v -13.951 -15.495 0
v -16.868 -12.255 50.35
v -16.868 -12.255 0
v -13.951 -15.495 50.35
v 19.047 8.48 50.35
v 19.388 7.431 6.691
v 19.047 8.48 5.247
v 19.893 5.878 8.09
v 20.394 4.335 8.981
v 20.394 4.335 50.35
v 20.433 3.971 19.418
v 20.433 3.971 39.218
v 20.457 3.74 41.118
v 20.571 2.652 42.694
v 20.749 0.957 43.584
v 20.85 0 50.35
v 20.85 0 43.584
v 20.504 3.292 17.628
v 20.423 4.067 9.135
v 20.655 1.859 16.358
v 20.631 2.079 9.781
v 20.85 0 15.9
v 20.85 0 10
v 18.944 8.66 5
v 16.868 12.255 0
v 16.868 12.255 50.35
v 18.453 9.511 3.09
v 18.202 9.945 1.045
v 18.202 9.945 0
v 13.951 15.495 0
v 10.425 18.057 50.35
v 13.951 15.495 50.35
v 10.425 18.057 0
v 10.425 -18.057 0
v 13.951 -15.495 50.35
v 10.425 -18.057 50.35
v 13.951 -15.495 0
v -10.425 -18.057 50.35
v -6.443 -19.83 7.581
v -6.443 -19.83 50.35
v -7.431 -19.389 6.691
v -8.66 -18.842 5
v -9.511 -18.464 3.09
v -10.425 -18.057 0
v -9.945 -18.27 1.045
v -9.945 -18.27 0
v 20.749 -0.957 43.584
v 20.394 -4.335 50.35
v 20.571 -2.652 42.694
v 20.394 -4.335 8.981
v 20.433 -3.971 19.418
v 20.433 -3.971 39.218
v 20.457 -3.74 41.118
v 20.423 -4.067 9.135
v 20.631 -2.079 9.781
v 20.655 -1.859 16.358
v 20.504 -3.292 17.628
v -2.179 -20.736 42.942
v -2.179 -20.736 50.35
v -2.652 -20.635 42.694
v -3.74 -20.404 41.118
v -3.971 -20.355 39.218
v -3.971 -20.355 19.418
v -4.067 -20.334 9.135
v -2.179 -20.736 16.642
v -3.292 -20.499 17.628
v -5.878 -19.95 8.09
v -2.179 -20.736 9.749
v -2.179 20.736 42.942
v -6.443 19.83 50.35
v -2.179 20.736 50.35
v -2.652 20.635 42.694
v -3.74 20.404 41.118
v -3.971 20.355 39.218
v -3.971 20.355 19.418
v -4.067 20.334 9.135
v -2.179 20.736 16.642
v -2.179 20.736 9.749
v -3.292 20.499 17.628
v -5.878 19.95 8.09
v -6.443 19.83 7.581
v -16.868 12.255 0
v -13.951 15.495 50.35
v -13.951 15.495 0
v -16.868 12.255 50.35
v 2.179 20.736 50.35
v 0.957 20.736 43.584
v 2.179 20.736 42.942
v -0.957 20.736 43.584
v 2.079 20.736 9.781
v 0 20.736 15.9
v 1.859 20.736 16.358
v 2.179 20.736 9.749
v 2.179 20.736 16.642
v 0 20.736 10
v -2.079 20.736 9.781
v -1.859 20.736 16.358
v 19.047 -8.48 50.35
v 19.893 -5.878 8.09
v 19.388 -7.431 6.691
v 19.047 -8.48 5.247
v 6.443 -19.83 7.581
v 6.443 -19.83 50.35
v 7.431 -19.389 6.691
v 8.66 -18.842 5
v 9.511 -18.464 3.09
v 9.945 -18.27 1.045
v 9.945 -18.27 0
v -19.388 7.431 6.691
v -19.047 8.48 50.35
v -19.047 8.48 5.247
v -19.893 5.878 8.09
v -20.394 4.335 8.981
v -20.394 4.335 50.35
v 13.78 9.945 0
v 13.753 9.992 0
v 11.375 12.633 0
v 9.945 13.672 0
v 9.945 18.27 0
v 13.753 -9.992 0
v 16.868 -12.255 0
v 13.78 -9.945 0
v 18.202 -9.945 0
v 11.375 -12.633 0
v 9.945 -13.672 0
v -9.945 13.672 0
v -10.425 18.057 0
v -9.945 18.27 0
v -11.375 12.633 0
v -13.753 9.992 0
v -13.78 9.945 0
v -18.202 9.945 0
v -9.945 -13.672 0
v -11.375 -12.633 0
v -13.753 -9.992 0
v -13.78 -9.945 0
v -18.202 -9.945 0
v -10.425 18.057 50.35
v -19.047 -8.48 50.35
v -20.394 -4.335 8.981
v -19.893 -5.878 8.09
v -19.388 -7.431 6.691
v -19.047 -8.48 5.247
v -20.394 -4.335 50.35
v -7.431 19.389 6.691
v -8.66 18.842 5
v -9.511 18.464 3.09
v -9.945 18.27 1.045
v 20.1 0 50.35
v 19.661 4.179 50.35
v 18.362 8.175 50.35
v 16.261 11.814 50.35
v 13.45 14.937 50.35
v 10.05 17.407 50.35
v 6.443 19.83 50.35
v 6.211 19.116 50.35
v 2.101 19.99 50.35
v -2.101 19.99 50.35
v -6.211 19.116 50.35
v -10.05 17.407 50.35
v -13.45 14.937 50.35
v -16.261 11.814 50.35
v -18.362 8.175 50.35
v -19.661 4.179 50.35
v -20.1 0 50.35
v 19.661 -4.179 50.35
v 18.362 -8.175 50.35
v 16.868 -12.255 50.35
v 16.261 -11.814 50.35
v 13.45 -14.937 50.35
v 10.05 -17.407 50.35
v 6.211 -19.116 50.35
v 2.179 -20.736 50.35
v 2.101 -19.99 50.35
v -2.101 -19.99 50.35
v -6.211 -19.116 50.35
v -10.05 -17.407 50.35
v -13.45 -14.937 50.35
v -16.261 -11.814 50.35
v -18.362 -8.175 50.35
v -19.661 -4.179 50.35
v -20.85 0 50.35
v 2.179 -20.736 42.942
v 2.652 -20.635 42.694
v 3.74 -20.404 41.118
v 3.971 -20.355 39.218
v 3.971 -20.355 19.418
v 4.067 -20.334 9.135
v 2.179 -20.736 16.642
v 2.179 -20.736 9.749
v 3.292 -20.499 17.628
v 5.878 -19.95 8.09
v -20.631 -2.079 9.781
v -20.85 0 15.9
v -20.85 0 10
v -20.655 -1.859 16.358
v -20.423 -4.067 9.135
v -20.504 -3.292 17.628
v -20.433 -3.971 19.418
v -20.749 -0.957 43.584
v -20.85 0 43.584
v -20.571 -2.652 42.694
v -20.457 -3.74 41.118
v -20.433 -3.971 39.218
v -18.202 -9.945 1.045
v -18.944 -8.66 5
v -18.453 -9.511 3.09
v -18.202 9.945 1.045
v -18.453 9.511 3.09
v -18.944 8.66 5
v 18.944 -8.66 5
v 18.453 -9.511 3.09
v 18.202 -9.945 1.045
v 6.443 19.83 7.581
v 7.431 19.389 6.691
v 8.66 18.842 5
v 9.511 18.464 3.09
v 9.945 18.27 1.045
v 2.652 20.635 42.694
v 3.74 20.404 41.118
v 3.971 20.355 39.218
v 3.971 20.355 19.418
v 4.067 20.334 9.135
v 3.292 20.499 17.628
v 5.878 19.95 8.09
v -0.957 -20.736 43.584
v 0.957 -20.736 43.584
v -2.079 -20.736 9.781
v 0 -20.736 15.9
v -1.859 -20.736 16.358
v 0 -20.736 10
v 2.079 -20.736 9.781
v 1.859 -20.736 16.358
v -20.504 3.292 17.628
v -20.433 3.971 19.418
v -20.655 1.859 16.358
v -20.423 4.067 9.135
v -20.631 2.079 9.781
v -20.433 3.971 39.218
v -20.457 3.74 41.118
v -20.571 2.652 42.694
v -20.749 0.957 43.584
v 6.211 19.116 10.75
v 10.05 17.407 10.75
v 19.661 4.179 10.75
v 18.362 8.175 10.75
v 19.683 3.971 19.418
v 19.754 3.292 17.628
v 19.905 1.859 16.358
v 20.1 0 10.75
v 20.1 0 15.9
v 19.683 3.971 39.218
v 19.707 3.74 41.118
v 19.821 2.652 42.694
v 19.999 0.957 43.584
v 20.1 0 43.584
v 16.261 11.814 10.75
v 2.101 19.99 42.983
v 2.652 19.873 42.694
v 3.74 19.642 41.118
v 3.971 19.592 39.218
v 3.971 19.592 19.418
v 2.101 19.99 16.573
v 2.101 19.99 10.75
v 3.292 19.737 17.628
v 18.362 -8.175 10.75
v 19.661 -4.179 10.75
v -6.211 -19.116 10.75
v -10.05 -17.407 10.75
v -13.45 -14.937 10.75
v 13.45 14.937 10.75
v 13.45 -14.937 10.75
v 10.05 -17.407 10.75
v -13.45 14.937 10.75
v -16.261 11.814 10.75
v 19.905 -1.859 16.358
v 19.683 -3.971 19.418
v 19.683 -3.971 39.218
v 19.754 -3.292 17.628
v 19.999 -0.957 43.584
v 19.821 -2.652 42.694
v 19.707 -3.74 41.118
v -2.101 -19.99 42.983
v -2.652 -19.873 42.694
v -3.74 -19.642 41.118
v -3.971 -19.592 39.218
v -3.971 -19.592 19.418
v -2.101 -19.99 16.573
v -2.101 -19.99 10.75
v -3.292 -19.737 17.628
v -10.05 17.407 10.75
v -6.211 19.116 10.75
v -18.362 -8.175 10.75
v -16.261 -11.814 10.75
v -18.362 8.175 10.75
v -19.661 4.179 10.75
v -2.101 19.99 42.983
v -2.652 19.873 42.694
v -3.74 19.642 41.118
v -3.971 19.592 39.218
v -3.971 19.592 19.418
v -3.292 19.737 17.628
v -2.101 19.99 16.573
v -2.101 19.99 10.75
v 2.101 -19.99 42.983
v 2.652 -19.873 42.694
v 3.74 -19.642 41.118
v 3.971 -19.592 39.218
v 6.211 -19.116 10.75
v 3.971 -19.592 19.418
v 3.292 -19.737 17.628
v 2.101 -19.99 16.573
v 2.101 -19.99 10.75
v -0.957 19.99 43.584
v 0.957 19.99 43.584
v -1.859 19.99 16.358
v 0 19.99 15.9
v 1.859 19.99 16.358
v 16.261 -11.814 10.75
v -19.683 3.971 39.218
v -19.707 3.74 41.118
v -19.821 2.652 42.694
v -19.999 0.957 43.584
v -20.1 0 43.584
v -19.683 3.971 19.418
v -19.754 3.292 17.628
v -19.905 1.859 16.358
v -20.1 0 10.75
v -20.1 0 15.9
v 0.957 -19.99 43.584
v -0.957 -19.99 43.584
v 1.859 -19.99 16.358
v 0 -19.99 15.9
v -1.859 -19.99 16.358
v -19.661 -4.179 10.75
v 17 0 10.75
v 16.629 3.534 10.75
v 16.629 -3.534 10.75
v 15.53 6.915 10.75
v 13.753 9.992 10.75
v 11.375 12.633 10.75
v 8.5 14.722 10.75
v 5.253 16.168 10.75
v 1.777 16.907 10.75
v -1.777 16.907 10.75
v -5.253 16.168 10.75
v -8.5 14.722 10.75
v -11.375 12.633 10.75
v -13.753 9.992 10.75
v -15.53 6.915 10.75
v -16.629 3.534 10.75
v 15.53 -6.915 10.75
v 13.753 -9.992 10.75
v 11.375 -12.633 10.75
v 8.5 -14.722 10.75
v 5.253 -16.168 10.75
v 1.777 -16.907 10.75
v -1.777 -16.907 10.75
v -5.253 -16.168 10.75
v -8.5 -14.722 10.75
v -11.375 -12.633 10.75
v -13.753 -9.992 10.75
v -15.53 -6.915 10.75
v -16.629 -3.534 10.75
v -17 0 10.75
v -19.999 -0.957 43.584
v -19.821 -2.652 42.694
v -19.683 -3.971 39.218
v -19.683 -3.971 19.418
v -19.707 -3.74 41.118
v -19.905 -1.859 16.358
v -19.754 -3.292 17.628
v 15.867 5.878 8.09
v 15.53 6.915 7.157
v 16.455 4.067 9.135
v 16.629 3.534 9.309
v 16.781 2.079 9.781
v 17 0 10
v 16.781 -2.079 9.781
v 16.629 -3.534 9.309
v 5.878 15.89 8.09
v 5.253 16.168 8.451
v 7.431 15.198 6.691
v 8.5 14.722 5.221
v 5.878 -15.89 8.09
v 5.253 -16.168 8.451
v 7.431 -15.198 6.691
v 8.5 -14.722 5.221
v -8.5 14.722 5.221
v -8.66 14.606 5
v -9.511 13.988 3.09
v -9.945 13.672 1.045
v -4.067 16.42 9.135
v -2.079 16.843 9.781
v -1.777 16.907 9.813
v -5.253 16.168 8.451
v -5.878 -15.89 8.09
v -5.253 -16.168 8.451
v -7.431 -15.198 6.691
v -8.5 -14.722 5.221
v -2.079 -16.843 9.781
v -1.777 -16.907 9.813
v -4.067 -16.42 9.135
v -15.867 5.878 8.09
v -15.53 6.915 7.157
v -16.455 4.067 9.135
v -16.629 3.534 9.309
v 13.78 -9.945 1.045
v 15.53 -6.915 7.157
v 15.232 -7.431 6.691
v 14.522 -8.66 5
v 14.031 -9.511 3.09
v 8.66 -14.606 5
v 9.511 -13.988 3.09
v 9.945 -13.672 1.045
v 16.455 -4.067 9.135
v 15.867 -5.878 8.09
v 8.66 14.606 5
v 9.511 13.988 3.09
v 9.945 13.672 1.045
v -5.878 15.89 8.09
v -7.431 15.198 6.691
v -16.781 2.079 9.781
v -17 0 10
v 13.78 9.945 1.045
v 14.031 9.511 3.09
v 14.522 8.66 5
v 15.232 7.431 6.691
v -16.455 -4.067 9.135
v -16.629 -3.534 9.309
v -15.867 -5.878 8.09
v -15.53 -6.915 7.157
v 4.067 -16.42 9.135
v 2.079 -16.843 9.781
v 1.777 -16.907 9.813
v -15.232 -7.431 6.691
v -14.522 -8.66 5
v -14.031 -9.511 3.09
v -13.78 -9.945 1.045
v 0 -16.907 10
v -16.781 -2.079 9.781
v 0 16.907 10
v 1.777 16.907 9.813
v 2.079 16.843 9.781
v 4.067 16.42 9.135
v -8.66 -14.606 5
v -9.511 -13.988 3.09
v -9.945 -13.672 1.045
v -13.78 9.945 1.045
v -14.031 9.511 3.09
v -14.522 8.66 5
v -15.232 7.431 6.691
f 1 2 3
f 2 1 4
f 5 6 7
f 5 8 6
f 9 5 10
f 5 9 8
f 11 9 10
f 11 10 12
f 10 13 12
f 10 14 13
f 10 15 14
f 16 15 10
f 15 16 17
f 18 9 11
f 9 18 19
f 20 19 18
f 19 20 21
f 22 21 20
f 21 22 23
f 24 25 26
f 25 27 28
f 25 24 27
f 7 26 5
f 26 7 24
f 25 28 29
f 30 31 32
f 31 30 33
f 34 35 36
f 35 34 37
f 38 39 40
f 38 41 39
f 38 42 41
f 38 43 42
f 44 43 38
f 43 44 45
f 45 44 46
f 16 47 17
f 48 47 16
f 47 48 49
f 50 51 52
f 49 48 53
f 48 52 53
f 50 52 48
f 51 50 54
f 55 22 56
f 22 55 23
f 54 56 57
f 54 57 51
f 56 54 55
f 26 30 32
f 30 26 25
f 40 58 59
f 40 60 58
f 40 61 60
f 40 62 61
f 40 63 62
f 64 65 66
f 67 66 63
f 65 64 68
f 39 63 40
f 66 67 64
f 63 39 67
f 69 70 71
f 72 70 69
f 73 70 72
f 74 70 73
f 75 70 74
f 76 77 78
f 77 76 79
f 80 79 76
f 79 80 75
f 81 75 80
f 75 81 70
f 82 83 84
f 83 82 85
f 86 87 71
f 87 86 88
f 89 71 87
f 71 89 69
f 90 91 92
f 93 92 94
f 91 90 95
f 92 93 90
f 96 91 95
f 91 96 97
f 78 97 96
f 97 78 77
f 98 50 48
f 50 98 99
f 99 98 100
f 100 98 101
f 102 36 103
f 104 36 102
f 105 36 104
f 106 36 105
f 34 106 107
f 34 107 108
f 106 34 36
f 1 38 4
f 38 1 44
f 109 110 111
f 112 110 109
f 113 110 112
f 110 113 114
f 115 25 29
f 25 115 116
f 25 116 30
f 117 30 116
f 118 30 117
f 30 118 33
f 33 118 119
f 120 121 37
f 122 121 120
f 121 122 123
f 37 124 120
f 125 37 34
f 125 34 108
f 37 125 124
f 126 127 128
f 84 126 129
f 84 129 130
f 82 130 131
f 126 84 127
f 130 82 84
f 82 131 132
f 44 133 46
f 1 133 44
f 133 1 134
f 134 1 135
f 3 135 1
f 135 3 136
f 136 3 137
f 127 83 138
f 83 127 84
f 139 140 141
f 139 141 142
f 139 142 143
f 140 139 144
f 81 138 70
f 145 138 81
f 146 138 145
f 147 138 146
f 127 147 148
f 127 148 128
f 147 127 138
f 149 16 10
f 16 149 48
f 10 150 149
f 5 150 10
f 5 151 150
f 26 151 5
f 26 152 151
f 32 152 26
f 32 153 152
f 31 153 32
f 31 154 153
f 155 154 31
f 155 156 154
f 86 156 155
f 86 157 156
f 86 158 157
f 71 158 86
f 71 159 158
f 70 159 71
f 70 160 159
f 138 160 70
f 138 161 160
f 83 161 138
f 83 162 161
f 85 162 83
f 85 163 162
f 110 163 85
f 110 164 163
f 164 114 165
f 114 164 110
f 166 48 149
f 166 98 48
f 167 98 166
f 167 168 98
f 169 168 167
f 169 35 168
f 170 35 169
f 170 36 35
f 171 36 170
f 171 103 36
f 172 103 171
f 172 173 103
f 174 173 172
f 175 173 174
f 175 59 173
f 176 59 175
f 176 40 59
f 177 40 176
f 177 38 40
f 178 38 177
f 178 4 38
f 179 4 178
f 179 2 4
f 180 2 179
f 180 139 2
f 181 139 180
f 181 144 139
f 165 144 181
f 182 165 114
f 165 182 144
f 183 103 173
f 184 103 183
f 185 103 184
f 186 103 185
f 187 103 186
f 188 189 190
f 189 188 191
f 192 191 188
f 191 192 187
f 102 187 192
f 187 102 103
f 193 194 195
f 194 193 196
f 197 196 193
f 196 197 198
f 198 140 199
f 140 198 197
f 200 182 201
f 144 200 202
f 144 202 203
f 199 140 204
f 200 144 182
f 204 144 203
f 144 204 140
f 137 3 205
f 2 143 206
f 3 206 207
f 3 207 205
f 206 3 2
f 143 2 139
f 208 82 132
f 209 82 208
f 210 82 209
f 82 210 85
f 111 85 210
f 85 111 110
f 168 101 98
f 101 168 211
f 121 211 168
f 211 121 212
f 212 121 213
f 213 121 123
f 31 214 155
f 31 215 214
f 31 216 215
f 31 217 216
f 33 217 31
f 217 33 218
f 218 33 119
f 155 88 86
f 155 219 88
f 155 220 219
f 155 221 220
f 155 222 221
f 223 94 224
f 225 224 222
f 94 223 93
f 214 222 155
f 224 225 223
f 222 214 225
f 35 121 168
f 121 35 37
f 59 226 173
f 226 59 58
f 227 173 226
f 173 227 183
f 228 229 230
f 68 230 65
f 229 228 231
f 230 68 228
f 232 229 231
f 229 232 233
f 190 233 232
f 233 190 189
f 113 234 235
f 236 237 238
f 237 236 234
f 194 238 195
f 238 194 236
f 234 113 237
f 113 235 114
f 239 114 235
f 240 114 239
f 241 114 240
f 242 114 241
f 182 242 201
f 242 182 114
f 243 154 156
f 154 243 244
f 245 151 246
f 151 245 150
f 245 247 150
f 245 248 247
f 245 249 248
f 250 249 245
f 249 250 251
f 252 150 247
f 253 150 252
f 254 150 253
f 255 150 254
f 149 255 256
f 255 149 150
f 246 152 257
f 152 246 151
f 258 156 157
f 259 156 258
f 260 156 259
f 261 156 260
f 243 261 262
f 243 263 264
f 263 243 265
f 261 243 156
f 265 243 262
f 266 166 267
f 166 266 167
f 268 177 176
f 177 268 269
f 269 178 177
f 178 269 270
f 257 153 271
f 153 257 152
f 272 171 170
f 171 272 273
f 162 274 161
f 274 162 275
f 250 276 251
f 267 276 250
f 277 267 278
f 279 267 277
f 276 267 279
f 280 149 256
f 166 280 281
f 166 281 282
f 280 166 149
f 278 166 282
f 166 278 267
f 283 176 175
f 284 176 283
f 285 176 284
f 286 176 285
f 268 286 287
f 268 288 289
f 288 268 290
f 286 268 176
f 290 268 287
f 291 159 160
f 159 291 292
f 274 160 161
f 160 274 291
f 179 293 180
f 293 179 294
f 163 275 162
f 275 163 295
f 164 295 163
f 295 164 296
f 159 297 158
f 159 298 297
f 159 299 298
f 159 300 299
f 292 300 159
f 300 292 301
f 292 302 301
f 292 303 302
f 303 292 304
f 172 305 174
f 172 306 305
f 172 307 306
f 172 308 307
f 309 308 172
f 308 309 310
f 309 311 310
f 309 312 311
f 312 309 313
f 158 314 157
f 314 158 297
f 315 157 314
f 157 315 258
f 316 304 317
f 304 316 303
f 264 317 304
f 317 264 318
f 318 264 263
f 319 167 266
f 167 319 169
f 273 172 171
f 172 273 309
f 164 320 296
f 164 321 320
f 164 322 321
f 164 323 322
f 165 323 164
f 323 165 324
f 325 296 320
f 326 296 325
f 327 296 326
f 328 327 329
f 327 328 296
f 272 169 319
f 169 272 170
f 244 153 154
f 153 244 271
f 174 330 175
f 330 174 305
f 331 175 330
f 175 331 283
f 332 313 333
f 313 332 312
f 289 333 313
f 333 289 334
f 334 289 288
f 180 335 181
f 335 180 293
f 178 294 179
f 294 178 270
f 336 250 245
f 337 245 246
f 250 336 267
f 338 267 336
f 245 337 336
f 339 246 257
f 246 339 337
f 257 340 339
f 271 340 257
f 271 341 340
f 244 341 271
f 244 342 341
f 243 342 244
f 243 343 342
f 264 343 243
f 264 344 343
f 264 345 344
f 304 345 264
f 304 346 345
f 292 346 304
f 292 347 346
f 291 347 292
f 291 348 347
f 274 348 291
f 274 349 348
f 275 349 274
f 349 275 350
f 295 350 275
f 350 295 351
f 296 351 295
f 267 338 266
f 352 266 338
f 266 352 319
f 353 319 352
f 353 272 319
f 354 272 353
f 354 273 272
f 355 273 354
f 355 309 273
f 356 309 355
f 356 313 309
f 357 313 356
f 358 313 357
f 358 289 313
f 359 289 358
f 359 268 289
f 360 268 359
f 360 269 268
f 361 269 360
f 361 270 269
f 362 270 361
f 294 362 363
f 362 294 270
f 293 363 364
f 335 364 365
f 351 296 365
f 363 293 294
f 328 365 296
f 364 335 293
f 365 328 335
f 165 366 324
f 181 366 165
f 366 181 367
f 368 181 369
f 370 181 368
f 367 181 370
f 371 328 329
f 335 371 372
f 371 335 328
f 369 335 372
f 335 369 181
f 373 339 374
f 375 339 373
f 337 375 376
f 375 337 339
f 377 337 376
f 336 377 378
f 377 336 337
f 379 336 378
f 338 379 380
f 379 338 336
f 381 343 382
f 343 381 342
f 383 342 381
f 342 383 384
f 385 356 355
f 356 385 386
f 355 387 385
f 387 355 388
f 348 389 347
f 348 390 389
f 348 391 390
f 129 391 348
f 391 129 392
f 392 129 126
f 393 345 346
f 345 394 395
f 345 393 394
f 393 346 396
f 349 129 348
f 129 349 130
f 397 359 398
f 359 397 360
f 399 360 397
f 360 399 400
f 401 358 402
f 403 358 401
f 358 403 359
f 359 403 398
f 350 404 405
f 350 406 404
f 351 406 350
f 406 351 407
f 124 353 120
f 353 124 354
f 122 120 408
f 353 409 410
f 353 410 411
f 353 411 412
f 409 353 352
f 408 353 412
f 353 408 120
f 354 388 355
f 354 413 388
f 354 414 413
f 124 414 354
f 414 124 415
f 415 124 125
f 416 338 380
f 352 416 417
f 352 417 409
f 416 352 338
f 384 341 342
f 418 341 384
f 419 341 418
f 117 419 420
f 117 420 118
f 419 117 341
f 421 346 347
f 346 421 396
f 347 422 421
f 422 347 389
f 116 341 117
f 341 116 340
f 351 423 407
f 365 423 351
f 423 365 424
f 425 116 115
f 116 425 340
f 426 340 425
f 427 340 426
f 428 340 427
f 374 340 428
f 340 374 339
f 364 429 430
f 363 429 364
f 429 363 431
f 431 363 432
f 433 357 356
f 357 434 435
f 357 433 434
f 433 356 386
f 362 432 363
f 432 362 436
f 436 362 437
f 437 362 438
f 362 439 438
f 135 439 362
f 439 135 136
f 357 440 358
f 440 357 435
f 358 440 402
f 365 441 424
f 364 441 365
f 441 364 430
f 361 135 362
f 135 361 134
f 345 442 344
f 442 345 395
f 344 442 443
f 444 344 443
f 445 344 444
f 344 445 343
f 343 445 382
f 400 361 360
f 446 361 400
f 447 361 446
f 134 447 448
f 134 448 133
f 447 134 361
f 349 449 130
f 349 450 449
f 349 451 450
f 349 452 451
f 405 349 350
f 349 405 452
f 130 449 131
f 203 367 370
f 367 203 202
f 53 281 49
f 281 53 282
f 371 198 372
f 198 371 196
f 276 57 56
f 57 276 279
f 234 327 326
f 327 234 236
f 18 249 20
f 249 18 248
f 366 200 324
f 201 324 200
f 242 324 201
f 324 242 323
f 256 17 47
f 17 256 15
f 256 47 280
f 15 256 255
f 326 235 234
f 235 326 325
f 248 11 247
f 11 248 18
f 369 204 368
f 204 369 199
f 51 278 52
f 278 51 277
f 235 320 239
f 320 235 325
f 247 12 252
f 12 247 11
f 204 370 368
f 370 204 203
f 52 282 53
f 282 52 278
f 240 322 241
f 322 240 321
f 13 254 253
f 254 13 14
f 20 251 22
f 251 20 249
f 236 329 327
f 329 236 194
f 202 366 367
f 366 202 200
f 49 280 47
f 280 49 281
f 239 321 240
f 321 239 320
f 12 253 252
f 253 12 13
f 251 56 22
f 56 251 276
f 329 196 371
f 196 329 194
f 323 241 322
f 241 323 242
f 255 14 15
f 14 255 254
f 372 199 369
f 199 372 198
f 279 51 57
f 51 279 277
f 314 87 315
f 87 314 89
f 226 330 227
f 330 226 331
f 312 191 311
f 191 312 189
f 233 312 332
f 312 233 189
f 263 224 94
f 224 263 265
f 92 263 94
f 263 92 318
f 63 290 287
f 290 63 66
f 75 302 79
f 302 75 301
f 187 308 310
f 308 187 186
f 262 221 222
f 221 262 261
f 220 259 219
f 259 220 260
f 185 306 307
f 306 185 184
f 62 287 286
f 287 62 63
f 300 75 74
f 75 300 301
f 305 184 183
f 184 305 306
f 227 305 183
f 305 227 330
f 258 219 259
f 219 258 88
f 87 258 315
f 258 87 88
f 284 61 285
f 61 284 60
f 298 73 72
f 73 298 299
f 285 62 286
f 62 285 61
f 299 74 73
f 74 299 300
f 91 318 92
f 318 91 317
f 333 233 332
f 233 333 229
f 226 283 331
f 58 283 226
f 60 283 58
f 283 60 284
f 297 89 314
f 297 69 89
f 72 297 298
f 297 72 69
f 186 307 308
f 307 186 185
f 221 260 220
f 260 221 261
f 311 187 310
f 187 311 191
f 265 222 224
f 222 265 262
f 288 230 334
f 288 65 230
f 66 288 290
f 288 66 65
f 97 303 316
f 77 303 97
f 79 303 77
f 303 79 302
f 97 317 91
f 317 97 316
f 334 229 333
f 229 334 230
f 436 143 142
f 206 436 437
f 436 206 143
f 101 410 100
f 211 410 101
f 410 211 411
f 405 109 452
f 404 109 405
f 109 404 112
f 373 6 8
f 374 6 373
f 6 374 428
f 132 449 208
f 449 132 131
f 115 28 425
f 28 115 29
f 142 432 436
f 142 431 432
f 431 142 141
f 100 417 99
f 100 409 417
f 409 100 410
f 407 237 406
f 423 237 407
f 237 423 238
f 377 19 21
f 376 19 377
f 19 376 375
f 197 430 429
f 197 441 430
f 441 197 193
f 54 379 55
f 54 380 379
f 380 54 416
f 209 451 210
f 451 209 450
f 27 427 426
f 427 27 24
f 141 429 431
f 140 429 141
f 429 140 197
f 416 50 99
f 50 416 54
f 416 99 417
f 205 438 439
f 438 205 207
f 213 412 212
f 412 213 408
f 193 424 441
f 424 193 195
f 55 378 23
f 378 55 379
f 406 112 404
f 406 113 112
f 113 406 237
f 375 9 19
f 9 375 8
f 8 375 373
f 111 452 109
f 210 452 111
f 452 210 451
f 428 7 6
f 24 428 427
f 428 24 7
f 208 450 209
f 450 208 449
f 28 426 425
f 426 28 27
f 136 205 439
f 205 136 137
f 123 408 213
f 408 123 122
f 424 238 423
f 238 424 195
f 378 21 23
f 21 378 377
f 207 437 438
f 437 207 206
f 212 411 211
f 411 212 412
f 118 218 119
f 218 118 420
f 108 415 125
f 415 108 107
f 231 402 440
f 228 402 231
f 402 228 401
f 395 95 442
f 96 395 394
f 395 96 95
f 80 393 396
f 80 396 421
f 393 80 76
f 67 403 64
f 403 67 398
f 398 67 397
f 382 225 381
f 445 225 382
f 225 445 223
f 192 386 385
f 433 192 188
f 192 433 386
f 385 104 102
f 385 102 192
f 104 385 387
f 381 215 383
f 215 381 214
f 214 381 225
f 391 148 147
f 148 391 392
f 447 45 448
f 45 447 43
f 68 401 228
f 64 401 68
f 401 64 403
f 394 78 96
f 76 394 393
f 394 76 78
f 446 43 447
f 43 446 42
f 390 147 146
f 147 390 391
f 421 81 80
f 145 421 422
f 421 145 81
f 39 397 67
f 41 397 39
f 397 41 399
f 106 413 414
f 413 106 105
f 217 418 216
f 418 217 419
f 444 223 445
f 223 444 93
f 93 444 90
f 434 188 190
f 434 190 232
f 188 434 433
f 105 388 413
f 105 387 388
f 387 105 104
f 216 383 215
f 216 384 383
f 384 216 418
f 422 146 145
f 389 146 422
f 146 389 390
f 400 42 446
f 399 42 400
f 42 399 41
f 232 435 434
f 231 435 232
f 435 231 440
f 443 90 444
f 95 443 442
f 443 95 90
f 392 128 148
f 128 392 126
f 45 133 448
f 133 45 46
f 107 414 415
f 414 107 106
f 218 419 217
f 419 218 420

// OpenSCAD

// millimeters
chip_diameter = 40;

// millimeters
chip_thickness = 3.3;

// number of chips
stack_height = 12;

wall_thickness = 0.75;

slot_opening = 8;

leg_length = 10;

/* [Hidden] */

slop = 0.2;

difference() {
    cylinder(h=((stack_height * chip_thickness) + wall_thickness + leg_length), d=(chip_diameter + (2 * wall_thickness) + slop));
    
    translate([0,0,wall_thickness + leg_length])
    cylinder(h=(stack_height * chip_thickness), d=chip_diameter + slop);
    
    cylinder(h=(wall_thickness + leg_length), d=(chip_diameter - (8 * wall_thickness)));
        
    translate([-(chip_diameter + (2 * wall_thickness) + slop)/2, 0, (chip_thickness * stack_height)/2 + leg_length])
    rotate([0,90,0])
    hull() {
        translate([(chip_thickness * stack_height)/4, 0, 0])
        cylinder(h=(chip_diameter + (2 * wall_thickness) + slop), d=slot_opening);
        
        translate([-(chip_thickness * stack_height)/4, 0, 0])
        cylinder(h=(chip_diameter + (2 * wall_thickness) + slop), d=slot_opening);
    };
    
    translate([0, -(chip_diameter + (2 * wall_thickness) + slop)/2, (chip_thickness * stack_height)/2 + leg_length])
    rotate([0,90,90])
    hull() {
        translate([(chip_thickness * stack_height)/4, 0, 0])
        cylinder(h=(chip_diameter + (2 * wall_thickness) + slop), d=slot_opening);
        
        translate([-(chip_thickness * stack_height)/4, 0, 0])
        cylinder(h=(chip_diameter + (2 * wall_thickness) + slop), d=slot_opening);
    };
    
    translate([-(chip_diameter + (2 * wall_thickness) + slop)/2,0,0])
    rotate([0,90,0])
    cylinder(h=(chip_diameter + (2 * wall_thickness) + slop), d=(chip_diameter/2));
    
    translate([0,-(chip_diameter + (2 * wall_thickness) + slop)/2,0])
    rotate([0,90,90])
    cylinder(h=(chip_diameter + (2 * wall_thickness) + slop), d=(chip_diameter/2));
};
